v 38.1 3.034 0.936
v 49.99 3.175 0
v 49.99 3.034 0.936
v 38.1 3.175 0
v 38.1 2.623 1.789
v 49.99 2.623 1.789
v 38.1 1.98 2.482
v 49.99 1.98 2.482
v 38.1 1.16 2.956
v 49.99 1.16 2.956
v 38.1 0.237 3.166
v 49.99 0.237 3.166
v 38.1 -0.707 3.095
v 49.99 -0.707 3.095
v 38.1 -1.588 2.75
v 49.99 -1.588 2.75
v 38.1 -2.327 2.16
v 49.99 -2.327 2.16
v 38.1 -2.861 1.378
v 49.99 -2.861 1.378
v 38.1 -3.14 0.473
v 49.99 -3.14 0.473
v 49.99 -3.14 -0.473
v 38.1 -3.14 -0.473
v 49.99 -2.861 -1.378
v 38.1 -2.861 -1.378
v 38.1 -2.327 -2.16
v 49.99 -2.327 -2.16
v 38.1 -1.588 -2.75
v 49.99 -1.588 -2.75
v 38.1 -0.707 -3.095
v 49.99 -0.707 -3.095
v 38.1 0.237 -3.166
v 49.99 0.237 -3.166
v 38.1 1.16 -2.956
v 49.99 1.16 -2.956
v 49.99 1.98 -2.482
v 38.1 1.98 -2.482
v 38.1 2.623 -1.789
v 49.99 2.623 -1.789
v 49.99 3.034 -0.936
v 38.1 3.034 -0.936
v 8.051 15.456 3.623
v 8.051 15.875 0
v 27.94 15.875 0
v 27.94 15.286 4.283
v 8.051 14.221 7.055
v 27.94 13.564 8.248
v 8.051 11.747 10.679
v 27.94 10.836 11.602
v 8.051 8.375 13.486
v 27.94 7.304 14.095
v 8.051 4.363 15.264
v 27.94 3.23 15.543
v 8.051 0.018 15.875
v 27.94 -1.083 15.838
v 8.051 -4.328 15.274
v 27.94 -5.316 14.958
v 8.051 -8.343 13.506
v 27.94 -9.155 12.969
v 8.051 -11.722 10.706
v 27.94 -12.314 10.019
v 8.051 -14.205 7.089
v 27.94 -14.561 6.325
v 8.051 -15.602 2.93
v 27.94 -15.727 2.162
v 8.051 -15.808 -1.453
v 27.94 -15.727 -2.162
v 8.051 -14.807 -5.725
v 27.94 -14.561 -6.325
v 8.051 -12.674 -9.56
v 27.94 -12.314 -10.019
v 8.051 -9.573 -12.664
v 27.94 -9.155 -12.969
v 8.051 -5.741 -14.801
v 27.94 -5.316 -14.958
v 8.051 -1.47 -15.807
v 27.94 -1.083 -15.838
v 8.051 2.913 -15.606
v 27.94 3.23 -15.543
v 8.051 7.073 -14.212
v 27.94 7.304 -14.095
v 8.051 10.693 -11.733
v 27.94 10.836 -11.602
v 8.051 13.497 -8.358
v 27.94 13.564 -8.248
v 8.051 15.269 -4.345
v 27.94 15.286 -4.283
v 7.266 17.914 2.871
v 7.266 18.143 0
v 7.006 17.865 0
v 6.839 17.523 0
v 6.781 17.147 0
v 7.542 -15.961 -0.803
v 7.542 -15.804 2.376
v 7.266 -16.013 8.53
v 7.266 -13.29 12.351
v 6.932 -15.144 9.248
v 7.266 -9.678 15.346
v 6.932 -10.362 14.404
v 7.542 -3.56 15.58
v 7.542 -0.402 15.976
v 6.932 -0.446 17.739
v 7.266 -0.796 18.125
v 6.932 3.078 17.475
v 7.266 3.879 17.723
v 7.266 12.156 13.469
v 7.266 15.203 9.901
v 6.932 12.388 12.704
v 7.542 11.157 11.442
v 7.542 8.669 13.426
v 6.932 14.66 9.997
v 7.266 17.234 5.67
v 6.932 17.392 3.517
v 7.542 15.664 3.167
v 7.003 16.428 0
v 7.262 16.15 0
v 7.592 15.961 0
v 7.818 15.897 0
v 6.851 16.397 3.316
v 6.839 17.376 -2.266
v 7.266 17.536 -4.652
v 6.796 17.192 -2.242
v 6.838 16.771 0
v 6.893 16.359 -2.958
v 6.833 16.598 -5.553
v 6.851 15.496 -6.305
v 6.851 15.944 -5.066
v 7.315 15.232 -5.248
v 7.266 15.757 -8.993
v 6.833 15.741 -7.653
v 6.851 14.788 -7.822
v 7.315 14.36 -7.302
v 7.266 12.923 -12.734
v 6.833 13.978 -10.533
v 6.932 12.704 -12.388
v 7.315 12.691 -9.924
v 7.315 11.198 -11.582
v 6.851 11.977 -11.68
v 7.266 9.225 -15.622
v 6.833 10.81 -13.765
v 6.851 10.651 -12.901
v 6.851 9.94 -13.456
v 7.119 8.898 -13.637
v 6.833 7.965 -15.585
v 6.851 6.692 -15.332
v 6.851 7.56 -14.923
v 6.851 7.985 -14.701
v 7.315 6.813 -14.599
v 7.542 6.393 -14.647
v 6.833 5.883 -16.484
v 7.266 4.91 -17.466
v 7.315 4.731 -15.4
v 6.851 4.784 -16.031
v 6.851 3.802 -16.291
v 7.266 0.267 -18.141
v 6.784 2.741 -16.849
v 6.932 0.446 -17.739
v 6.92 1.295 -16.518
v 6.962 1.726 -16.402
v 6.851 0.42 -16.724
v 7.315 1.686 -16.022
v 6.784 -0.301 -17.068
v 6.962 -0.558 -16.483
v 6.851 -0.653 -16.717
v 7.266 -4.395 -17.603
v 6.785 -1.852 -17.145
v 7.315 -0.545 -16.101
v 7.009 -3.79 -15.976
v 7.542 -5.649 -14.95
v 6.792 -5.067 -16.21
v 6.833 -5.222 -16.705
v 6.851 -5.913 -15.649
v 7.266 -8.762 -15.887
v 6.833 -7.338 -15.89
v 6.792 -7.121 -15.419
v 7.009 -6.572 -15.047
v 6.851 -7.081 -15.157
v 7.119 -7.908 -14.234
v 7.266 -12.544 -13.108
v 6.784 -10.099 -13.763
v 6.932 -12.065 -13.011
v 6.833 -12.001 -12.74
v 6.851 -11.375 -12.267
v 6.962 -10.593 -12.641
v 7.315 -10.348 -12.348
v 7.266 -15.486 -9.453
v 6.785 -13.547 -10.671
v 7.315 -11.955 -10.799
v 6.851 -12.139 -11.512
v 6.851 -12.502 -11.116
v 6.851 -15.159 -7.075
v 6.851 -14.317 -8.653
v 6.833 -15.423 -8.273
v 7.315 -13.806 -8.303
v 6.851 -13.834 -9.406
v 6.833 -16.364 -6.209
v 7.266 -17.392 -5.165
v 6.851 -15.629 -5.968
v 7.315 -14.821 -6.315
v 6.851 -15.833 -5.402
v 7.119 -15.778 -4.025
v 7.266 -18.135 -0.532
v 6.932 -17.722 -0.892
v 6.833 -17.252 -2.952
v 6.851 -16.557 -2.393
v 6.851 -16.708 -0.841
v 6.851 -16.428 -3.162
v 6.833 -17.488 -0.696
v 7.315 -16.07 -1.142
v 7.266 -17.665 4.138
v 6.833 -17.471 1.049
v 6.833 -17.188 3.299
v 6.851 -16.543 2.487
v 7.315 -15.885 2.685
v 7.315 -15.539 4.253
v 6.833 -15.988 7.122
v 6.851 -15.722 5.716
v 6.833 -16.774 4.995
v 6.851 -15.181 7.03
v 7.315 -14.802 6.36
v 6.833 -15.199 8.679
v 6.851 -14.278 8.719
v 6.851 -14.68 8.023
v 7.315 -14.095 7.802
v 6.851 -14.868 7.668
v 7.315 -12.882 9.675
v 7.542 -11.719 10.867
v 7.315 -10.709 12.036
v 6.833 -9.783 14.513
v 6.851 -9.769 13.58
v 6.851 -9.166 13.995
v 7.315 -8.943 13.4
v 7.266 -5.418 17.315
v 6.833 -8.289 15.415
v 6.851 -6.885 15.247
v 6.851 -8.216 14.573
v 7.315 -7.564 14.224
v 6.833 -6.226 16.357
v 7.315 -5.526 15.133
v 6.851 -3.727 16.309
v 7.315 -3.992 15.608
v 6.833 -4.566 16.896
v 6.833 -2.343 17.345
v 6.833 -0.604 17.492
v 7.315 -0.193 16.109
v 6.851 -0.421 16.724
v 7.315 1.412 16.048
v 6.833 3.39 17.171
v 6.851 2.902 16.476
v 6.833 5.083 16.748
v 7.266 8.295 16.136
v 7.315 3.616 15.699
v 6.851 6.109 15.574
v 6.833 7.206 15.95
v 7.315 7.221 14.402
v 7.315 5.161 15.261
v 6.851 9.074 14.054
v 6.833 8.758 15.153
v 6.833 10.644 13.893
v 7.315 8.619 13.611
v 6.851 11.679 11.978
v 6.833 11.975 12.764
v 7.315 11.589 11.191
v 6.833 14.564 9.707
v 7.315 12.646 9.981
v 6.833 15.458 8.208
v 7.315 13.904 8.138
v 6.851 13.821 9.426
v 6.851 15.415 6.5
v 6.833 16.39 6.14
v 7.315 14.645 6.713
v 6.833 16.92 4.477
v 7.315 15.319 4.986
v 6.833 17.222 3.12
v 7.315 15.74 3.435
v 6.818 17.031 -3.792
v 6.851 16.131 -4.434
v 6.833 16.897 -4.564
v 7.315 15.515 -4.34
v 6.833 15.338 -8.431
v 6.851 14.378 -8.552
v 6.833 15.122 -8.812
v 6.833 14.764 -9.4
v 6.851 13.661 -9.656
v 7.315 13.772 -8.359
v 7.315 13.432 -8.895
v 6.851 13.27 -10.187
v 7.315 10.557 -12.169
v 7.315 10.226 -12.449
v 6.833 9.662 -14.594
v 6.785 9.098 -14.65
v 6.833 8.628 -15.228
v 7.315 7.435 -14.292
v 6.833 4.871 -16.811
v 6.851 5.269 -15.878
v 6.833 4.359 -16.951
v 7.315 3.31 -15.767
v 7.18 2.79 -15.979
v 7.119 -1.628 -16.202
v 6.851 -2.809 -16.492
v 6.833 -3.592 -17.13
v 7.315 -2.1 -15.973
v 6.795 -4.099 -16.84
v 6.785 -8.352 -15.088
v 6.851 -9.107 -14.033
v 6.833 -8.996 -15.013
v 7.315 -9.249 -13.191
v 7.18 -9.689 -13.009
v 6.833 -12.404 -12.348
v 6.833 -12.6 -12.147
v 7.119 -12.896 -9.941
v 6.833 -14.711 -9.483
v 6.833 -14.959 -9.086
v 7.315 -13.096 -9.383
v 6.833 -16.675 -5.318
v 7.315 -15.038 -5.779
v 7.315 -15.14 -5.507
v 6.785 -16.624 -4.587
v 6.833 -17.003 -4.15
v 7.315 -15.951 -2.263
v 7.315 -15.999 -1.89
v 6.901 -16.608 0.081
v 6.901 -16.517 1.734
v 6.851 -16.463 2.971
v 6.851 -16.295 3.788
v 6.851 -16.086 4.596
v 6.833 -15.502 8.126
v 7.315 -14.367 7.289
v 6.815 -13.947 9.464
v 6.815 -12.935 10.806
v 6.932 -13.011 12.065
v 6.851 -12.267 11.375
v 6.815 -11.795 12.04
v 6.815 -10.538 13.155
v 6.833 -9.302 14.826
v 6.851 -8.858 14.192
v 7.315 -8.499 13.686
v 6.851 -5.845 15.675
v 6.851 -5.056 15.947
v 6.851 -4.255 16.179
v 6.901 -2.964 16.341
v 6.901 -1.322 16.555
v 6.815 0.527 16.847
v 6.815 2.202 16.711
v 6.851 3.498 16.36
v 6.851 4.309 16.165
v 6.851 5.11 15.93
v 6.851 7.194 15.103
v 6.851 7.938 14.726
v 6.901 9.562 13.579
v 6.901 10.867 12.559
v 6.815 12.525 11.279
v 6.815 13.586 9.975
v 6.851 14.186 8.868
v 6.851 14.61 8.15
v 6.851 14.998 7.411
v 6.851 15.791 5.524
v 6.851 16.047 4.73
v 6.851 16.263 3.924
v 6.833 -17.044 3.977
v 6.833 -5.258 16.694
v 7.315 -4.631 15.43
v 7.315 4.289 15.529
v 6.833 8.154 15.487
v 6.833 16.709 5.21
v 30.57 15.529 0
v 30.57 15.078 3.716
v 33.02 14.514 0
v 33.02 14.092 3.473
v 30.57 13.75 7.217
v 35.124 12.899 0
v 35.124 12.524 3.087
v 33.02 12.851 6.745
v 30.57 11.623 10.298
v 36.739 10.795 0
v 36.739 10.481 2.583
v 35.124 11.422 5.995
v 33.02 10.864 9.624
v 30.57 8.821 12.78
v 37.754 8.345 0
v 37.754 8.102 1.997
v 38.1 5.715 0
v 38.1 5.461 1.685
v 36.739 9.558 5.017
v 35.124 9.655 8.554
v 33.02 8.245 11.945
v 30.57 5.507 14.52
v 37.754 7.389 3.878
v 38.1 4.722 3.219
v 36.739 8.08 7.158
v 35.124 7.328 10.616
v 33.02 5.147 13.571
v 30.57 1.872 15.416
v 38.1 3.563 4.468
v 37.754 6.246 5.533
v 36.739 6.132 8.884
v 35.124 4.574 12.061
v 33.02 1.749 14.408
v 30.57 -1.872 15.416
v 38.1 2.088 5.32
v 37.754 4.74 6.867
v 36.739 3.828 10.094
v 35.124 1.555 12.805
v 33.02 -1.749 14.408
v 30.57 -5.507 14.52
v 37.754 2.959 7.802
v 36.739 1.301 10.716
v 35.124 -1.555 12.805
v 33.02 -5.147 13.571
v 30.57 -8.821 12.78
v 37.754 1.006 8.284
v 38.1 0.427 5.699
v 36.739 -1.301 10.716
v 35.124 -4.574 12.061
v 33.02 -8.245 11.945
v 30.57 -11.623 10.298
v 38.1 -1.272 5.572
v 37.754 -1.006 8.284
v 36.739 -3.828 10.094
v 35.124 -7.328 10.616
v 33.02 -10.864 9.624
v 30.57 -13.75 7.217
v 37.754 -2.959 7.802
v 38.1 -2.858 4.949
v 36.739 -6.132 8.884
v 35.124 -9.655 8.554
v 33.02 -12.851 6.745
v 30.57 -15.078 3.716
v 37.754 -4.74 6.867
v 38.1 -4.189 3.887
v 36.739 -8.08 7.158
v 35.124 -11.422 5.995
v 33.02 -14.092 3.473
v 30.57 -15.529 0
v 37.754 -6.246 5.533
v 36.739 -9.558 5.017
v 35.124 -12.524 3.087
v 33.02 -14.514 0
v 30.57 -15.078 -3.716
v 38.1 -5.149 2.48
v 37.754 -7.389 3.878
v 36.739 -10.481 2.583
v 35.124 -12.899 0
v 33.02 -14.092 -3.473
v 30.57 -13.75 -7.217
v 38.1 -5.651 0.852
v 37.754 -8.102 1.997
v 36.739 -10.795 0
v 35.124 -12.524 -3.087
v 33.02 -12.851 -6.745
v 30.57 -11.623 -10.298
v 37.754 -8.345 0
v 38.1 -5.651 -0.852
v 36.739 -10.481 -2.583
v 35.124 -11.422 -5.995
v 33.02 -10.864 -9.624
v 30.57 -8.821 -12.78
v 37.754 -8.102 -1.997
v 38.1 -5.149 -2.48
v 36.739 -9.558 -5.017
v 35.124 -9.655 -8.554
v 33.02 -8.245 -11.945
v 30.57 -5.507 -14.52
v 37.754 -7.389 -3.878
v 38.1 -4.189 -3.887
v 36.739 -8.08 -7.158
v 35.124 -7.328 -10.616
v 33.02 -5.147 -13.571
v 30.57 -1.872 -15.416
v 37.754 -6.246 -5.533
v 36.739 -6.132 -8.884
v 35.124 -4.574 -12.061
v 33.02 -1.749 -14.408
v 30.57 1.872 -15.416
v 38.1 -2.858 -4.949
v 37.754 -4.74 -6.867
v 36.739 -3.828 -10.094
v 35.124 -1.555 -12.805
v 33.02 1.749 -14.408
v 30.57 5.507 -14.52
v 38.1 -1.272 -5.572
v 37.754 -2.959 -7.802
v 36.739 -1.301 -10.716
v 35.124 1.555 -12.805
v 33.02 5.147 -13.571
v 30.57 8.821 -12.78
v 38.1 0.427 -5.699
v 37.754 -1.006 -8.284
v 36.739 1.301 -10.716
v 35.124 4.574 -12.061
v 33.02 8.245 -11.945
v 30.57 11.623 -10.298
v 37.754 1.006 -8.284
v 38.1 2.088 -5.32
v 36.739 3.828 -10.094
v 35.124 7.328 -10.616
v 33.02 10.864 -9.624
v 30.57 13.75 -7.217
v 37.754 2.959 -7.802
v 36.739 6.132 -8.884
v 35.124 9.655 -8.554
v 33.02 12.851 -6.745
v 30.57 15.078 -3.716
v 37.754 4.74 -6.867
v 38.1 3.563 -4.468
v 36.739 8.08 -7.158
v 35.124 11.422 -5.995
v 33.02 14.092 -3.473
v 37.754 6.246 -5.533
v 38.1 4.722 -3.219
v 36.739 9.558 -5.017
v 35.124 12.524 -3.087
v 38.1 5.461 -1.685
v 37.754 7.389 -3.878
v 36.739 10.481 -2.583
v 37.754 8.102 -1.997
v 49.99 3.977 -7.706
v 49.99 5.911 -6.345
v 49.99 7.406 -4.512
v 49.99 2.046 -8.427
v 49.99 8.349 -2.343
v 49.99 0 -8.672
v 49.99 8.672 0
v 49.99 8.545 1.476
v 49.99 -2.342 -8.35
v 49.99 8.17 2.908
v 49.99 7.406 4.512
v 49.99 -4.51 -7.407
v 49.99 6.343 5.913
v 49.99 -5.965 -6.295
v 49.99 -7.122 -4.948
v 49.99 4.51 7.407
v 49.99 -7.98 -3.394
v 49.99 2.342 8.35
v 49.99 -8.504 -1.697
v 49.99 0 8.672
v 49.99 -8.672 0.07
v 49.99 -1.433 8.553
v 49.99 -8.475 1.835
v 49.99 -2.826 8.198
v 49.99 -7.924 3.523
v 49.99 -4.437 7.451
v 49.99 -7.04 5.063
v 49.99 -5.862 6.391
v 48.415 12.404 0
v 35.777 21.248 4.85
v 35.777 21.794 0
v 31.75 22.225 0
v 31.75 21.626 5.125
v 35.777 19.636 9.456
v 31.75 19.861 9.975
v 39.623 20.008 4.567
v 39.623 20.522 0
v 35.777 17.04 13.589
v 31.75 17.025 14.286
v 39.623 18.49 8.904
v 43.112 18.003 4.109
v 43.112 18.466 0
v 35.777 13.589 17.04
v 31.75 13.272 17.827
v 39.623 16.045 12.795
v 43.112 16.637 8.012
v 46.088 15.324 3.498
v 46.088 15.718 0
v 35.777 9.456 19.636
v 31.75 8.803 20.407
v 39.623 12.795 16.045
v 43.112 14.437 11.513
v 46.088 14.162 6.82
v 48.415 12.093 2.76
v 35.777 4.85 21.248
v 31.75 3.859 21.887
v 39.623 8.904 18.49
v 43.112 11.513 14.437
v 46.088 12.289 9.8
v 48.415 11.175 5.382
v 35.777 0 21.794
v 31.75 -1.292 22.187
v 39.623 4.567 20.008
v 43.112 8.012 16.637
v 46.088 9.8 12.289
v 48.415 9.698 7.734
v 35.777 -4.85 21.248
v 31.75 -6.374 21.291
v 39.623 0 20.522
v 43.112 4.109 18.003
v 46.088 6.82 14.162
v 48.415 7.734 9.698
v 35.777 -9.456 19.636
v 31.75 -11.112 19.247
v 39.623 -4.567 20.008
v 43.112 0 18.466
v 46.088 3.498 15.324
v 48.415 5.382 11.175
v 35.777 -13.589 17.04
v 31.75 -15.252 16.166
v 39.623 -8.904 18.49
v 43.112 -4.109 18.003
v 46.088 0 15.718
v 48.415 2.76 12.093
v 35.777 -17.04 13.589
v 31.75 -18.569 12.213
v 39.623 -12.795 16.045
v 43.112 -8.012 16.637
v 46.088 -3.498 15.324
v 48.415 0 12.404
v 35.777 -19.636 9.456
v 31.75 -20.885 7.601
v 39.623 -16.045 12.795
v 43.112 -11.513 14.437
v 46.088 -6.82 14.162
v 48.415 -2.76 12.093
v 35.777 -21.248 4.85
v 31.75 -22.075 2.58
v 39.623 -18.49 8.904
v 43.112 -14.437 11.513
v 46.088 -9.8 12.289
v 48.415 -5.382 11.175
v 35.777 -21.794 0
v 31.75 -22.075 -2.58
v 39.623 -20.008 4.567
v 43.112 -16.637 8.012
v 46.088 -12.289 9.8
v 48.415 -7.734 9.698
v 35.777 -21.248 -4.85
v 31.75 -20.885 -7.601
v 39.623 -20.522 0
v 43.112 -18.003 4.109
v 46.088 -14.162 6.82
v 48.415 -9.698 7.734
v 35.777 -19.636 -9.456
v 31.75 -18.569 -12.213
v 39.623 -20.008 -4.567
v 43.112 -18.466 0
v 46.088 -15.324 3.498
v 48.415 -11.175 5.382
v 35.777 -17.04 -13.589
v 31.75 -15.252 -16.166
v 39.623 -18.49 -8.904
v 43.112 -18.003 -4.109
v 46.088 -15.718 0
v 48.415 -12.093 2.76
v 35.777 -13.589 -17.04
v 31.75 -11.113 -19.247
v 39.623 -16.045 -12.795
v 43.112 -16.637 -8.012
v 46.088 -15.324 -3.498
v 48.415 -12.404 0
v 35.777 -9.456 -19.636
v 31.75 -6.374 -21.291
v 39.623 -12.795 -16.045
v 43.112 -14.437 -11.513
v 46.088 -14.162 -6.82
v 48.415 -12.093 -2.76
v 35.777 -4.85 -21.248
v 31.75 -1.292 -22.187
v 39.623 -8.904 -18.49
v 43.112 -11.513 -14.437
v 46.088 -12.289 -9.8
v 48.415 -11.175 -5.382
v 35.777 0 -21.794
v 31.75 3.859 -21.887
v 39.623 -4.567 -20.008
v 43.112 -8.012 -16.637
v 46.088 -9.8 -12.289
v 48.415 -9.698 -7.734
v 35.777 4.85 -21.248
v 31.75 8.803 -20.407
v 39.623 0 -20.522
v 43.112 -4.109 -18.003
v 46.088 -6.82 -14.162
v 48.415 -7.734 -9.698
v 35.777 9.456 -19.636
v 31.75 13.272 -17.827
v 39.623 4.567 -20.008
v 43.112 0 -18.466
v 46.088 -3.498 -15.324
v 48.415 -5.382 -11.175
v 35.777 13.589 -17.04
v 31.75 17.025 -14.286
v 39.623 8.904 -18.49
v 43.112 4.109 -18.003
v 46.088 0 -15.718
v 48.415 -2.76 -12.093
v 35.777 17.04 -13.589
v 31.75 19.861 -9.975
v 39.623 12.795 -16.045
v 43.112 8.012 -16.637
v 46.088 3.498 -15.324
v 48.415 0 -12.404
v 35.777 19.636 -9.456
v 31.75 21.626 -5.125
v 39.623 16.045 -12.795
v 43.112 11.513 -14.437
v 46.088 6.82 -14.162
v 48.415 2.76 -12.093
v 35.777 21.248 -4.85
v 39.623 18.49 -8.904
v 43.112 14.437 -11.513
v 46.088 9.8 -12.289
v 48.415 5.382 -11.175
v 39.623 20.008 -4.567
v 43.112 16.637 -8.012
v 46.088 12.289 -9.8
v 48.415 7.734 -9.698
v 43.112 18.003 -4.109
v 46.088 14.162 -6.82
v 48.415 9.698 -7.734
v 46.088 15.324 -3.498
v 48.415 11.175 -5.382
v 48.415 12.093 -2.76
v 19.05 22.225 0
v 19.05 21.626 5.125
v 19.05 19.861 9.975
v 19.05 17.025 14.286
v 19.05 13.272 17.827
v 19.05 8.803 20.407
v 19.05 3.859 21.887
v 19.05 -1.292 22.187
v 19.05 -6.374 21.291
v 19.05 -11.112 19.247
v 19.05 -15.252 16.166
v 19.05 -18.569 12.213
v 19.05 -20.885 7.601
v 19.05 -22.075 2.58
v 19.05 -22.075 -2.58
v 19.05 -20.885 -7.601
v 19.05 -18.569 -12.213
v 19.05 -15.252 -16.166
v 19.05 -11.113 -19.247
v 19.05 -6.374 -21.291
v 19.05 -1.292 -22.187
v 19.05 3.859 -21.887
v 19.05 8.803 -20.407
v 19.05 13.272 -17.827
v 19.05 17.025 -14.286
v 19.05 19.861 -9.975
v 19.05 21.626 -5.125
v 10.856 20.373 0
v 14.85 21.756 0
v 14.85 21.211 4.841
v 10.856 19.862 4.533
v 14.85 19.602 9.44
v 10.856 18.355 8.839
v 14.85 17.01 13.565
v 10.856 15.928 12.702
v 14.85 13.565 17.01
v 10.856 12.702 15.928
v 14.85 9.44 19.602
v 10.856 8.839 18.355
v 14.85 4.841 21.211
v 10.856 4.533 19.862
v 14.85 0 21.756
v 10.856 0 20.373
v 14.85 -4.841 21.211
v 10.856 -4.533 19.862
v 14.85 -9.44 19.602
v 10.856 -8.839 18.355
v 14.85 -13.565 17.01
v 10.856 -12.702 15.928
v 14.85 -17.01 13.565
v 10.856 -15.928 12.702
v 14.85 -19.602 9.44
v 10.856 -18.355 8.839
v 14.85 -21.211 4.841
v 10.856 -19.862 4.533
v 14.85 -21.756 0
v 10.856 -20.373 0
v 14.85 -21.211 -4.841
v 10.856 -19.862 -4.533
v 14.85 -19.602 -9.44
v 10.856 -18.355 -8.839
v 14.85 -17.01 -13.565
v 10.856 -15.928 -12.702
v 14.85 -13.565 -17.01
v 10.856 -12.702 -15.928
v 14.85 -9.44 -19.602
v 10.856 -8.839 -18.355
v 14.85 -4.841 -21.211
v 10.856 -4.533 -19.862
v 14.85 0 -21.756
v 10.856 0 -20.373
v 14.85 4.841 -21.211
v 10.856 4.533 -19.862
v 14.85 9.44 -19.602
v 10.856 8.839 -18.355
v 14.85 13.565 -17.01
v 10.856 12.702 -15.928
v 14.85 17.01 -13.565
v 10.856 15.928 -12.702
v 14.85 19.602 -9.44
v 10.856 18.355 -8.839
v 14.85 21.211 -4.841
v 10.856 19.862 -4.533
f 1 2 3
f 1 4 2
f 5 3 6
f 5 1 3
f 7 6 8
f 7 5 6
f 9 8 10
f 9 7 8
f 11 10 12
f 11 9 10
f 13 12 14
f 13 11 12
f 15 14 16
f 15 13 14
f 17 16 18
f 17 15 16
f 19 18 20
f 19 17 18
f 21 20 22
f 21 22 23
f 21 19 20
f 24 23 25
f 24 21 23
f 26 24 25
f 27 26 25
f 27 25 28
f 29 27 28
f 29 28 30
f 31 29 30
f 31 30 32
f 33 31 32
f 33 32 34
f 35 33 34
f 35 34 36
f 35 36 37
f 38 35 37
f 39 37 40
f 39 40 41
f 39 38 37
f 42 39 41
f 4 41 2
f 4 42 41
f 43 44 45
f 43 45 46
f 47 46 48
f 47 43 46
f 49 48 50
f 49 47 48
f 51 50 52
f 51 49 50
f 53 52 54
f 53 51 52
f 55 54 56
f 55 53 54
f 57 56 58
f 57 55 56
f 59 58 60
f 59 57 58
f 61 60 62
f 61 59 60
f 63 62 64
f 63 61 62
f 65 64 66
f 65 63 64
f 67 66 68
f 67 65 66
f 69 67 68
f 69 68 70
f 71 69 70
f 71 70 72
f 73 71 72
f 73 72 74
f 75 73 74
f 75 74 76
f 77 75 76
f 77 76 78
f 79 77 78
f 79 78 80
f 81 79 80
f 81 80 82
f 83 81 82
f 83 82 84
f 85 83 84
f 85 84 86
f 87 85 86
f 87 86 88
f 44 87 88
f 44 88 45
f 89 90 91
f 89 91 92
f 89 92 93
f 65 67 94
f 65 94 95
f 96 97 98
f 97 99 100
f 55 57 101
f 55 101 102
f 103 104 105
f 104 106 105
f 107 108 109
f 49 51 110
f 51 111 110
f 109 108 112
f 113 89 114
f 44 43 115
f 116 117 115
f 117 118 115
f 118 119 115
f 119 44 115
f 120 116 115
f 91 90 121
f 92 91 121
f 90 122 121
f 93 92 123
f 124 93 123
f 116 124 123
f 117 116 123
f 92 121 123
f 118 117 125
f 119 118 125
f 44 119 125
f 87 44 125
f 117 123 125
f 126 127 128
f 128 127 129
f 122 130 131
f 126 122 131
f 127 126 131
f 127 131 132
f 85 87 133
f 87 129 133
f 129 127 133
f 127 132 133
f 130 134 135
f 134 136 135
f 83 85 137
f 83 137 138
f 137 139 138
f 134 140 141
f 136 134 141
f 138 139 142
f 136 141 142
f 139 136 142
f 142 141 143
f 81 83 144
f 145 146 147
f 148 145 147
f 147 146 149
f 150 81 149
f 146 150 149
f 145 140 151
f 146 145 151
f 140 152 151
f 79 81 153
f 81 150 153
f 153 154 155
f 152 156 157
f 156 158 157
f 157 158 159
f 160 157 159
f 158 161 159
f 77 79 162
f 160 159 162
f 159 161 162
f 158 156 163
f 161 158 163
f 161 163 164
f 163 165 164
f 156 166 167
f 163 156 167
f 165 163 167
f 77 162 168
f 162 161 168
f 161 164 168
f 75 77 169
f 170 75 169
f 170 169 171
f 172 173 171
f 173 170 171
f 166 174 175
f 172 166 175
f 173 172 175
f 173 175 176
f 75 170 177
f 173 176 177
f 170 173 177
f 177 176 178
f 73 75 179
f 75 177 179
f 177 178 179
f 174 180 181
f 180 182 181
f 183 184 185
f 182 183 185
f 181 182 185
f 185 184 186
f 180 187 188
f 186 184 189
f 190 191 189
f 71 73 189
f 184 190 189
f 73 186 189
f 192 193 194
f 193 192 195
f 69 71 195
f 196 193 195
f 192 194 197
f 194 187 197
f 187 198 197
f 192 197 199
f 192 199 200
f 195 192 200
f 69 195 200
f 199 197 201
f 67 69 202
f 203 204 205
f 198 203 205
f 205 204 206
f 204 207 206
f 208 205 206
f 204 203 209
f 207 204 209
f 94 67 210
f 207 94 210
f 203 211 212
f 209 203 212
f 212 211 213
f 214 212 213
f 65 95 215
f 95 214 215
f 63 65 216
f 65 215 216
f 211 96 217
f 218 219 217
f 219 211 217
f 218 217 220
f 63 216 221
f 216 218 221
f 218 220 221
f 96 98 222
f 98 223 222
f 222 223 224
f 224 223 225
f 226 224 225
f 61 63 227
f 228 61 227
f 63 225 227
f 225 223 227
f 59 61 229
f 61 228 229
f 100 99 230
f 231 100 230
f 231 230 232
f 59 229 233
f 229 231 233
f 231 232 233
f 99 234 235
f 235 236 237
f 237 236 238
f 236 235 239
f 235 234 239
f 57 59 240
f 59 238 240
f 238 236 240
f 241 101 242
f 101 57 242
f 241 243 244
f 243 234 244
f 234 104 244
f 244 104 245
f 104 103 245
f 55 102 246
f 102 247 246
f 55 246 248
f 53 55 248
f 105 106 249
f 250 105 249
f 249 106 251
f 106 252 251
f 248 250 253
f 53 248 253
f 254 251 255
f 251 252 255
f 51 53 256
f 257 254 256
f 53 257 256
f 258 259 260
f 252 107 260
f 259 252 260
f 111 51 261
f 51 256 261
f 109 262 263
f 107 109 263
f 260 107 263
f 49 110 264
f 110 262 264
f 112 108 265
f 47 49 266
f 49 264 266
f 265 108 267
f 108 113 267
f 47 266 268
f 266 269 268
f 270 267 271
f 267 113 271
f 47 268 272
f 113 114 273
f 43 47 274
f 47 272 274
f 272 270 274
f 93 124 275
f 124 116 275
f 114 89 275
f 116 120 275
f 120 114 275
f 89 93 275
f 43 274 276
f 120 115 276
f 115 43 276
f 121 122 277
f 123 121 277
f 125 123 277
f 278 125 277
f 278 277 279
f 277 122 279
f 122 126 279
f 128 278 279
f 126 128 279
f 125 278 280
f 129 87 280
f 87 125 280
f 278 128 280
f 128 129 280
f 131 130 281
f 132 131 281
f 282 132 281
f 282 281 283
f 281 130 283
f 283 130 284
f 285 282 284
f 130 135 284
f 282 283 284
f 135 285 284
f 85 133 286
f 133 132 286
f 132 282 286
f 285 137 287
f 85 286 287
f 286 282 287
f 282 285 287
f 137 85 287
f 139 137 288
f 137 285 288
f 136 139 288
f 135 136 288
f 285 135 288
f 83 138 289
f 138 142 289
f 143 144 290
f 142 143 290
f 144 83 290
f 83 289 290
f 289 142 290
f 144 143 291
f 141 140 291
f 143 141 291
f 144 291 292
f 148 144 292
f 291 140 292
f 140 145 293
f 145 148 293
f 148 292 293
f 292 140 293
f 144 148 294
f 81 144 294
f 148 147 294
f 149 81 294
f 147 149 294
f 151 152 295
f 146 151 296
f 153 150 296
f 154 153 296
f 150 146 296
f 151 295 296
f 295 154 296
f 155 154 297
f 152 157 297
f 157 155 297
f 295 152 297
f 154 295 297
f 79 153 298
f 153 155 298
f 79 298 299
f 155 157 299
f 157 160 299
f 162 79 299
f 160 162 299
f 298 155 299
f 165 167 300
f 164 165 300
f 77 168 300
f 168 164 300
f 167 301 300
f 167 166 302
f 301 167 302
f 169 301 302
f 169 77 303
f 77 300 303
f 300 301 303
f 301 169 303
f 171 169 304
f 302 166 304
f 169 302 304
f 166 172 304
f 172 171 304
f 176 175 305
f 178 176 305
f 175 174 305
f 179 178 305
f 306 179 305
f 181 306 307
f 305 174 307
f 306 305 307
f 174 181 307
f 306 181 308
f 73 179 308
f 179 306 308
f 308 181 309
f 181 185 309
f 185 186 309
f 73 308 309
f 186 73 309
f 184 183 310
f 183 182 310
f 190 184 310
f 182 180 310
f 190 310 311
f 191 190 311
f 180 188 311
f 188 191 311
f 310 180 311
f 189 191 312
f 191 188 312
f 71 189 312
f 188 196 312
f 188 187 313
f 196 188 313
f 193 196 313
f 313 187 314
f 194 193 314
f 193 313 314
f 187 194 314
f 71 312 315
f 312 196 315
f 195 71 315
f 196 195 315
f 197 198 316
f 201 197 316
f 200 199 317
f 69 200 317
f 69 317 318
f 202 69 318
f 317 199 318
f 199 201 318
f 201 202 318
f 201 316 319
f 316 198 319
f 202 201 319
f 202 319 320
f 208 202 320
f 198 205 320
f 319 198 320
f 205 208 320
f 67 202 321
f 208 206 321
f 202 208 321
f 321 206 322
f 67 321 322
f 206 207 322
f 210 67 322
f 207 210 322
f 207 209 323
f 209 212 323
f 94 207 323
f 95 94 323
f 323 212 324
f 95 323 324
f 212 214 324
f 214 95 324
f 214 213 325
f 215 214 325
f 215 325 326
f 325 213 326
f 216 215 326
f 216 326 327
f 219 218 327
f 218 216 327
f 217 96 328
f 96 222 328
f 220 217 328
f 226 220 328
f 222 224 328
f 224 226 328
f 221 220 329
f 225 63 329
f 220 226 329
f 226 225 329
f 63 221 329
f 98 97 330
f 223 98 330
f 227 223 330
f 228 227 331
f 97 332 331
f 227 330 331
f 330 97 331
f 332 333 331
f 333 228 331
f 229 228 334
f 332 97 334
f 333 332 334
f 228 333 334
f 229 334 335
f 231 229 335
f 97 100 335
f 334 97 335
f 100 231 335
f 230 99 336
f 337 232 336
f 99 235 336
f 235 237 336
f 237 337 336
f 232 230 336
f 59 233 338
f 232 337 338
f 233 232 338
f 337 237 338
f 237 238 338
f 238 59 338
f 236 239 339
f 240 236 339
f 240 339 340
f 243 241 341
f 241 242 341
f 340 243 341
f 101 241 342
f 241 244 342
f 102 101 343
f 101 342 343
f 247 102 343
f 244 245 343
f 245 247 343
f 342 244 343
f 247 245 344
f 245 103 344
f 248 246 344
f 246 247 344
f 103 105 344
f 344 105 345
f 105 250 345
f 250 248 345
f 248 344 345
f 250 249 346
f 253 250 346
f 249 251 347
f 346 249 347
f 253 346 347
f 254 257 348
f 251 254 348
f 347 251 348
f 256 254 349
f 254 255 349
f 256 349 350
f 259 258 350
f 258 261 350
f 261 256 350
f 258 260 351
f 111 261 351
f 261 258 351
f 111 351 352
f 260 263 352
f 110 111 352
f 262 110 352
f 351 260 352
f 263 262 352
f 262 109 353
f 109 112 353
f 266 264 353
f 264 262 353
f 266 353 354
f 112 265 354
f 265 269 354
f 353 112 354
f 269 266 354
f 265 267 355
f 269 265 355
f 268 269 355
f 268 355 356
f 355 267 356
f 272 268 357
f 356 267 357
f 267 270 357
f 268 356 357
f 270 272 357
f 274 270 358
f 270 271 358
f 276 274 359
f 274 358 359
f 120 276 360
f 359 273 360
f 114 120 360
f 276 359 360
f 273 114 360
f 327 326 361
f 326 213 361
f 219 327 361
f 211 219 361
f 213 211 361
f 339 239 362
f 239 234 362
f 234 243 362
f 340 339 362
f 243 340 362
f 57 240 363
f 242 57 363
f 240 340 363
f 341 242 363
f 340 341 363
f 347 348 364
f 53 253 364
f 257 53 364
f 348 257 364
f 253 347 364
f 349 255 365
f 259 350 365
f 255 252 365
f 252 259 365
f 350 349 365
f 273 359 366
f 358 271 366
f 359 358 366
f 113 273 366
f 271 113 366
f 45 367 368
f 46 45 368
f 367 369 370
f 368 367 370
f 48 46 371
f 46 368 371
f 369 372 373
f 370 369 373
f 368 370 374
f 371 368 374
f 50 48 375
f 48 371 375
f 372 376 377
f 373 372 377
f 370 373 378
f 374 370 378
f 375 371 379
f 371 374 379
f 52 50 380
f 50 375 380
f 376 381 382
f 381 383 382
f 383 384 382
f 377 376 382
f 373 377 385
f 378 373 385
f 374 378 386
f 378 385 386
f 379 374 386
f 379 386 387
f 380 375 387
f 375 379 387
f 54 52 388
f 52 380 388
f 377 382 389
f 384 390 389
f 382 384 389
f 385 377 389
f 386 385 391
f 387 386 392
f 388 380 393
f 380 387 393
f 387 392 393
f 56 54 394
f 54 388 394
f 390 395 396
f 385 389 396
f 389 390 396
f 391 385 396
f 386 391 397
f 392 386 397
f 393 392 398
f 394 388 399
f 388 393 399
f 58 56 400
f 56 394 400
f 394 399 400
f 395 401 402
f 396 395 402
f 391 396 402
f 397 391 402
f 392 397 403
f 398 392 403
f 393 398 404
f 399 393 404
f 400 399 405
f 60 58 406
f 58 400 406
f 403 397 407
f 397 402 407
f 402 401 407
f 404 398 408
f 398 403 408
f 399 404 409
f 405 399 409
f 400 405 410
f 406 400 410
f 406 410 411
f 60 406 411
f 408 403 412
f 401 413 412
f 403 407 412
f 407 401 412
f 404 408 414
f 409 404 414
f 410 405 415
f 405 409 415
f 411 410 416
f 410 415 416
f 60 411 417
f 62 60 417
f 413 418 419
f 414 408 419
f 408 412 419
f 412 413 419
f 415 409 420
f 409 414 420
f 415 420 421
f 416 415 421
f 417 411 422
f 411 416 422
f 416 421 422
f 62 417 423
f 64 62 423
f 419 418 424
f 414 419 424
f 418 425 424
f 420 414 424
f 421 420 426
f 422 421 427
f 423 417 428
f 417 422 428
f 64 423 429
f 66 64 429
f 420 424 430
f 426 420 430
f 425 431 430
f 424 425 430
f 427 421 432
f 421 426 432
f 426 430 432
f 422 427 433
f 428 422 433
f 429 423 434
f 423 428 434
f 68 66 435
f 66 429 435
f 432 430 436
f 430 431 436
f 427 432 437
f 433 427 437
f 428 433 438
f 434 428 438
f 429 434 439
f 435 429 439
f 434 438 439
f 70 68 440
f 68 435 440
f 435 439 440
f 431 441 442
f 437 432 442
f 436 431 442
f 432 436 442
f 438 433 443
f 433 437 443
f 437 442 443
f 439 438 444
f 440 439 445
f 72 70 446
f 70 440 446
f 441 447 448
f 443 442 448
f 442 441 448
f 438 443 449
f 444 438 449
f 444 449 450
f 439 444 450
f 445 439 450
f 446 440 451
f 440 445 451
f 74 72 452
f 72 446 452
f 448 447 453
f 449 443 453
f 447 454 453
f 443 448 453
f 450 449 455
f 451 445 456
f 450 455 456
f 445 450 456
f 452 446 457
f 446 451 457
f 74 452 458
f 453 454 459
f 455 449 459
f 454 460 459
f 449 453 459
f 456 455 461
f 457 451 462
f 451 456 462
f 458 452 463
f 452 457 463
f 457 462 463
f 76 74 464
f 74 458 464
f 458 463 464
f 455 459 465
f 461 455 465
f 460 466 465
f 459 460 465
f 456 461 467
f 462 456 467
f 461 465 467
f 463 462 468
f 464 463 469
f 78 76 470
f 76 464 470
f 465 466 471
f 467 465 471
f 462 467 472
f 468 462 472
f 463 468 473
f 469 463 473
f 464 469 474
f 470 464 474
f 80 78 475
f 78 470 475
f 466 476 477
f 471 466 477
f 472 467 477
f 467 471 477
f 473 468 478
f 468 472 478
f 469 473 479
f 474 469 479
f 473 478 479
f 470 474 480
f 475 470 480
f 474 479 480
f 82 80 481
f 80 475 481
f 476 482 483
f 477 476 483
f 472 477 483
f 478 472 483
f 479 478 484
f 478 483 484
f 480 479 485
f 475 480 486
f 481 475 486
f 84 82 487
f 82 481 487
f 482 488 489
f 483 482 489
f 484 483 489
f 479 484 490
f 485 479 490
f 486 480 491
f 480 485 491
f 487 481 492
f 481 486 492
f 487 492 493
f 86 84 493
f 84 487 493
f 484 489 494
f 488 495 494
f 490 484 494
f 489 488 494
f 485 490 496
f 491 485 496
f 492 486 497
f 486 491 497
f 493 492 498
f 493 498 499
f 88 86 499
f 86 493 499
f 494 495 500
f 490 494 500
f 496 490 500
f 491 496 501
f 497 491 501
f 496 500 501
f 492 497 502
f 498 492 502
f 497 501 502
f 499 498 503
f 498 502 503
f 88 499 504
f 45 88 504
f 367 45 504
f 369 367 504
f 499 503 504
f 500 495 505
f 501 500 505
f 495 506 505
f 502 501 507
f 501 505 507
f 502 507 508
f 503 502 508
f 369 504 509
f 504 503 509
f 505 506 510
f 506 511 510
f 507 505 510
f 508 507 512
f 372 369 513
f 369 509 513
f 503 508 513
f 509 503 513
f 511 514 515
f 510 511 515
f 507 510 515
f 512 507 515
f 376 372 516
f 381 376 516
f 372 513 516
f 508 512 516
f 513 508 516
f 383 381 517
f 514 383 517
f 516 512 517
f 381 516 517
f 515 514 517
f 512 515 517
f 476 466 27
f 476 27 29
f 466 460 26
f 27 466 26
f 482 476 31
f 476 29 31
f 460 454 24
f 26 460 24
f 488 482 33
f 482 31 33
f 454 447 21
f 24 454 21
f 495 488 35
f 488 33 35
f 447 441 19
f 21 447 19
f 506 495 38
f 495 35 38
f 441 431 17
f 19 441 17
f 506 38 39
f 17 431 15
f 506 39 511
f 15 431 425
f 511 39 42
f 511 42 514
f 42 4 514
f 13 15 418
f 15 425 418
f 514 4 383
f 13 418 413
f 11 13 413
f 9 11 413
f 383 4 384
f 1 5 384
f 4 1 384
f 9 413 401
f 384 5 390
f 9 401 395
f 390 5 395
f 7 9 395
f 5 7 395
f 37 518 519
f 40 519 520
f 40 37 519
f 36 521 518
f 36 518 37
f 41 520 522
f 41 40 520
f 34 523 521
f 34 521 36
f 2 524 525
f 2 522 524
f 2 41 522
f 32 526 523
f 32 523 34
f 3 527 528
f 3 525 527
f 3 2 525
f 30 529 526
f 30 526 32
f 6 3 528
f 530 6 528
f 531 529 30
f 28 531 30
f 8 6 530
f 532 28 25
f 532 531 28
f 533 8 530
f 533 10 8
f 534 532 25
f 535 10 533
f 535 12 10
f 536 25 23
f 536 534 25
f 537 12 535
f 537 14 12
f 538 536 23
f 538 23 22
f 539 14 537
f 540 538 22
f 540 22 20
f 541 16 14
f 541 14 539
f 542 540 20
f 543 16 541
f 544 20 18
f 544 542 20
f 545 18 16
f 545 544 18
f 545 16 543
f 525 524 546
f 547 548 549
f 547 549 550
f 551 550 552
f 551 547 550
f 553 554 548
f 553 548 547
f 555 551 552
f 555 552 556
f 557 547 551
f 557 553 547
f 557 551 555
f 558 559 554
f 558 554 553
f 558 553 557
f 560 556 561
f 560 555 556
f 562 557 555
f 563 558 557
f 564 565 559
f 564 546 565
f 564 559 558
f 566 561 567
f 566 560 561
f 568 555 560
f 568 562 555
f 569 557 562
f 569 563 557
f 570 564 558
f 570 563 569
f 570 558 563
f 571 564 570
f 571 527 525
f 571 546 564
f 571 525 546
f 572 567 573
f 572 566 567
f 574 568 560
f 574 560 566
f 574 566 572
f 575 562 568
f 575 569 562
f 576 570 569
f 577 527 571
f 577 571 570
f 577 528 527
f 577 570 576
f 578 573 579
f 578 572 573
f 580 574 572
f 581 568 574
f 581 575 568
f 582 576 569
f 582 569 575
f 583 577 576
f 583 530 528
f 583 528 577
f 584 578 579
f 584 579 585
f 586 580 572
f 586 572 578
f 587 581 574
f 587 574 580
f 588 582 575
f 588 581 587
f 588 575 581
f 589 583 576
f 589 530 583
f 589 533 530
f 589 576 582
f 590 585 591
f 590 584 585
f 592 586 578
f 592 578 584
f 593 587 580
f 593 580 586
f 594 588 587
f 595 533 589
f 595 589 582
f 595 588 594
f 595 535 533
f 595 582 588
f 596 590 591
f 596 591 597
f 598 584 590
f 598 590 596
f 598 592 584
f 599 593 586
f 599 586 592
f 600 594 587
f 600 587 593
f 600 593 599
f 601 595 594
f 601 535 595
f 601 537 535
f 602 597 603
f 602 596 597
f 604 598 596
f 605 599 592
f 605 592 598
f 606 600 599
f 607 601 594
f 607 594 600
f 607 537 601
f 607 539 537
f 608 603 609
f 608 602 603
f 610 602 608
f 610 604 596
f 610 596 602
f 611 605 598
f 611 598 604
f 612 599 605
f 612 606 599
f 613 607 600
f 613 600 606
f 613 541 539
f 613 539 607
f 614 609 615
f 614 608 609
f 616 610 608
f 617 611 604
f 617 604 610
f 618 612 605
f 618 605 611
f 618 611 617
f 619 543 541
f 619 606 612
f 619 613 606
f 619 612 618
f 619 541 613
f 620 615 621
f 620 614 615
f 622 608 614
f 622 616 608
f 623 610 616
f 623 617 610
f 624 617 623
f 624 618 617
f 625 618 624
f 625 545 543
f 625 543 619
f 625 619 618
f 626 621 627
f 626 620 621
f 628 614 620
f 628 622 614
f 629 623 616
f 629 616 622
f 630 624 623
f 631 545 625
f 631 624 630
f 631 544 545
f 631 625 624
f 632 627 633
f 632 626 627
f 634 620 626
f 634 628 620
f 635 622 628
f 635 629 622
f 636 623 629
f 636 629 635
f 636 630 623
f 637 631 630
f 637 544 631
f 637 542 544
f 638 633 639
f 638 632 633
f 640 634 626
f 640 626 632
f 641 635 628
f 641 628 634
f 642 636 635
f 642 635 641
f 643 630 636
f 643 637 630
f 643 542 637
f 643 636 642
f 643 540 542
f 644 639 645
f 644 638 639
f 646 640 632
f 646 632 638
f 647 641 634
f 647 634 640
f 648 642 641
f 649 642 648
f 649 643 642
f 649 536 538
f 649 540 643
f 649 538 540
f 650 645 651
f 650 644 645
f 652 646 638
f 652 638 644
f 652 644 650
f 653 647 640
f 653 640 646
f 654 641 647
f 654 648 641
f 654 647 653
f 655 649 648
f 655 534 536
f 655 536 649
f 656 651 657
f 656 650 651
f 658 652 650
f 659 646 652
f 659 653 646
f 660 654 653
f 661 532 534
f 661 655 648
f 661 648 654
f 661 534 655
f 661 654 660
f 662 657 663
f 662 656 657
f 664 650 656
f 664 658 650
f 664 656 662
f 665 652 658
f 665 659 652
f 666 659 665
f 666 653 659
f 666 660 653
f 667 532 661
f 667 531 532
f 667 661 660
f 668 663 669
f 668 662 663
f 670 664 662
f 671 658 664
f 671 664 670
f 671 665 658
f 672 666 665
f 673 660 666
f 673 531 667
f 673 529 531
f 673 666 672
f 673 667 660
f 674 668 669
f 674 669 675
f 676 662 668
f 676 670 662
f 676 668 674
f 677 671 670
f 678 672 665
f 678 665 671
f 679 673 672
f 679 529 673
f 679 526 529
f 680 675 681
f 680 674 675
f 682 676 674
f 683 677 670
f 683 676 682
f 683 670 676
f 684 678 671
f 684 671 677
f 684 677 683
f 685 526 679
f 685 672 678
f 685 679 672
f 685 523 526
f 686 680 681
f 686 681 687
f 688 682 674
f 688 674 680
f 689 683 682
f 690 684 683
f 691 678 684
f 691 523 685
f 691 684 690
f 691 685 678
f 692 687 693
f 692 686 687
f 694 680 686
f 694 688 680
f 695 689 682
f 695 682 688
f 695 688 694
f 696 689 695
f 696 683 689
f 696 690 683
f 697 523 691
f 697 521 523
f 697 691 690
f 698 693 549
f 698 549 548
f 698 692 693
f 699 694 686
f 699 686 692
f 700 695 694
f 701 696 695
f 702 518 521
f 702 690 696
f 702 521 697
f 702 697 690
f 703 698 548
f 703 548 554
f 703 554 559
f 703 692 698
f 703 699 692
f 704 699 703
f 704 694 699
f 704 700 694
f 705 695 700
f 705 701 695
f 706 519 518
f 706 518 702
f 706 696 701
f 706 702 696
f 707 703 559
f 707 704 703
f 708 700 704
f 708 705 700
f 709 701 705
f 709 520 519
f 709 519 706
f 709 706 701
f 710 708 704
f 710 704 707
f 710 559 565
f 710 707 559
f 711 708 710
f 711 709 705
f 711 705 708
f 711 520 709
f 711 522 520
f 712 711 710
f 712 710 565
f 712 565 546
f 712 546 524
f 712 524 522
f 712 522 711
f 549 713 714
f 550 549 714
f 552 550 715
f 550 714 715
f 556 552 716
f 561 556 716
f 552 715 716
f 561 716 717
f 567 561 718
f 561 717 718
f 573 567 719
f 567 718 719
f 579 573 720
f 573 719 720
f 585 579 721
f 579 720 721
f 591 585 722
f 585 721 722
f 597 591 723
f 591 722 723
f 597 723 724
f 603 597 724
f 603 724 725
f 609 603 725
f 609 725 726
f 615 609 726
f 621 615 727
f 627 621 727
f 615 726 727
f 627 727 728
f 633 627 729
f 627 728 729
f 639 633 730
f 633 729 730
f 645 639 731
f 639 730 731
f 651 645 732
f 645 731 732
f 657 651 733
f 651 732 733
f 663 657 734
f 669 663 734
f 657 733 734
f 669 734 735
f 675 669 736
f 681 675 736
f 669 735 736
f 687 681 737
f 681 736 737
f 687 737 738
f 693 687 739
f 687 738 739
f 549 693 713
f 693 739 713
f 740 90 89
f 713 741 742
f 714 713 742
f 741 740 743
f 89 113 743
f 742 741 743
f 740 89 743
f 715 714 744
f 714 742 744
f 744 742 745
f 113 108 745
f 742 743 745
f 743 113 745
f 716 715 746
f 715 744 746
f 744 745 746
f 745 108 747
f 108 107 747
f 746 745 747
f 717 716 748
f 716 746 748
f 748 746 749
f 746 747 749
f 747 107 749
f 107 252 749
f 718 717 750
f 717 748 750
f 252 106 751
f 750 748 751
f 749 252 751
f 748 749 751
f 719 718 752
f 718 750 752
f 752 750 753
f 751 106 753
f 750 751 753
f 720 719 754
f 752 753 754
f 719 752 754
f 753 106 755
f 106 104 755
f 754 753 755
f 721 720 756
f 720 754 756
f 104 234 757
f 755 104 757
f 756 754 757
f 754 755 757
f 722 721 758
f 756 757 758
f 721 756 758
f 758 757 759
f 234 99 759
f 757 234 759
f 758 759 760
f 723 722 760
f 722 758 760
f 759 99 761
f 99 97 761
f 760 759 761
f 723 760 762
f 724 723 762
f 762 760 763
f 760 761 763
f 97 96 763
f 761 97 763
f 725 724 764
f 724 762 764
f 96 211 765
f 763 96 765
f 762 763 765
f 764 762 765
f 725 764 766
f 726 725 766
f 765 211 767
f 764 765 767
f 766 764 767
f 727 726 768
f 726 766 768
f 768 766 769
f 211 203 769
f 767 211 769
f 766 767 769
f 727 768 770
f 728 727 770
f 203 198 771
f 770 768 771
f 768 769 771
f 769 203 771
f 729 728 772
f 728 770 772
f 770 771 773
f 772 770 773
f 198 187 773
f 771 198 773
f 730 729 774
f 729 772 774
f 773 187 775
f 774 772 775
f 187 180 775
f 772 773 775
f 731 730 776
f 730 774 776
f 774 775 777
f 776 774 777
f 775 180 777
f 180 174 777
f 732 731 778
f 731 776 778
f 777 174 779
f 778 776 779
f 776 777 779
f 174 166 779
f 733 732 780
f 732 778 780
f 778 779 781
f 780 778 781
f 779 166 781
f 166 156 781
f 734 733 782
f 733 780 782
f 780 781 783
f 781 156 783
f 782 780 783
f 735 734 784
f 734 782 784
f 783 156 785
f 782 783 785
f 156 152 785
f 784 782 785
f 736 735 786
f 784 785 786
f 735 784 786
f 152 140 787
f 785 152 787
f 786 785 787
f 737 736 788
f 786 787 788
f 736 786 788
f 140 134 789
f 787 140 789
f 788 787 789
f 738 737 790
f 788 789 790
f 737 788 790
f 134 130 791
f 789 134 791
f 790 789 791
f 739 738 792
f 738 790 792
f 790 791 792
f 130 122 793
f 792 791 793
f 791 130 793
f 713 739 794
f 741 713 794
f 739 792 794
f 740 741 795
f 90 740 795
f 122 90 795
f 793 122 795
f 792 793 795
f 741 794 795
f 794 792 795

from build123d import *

# Parameters (mm, degrees)
F0_R           = 22.225
F1_DEPTH       = 50.8
F2_R           = 19.05
F3_R           = 15.875
F4_DEPTH       = 38.1
F5_R           = 1.27
F6_R           = 3.175
F7_DEPTH       = 50.801
F8_R           = 10.16
F9_W           = 6.6301524639
F9_H           = 19.9486073107
F10_DEPTH      = 22.2260001
F10_DEPTH_BACK = 25.4


with BuildPart() as f1:
    # F0 (on Right) → F1 (new body)
    with BuildSketch(Plane.YZ):
        Circle(F0_R)
    extrude(amount=F1_DEPTH)

    # F2
    f2_edges = [f1.edges().sort_by_distance(p)[0] for p in [
        (0, -22.225, 0),
        (50.8, -22.225, 0),
    ]]
    fillet(f2_edges, radius=F2_R)

    # F3 (on Right) → F4 (cut)
    with BuildSketch(Plane.YZ):
        Circle(F3_R)
    extrude(amount=F4_DEPTH, mode=Mode.SUBTRACT)

    # F5
    f5_edges = [f1.edges().sort_by_distance(p)[0] for p in [
        (4.850968, -15.875, 0),
    ]]
    fillet(f5_edges, radius=F5_R)

    # F6 (on Right) → F7 (cut, through all)
    with BuildSketch(Plane.YZ):
        Circle(F6_R)
    extrude(amount=F7_DEPTH, mode=Mode.SUBTRACT)

    # F8
    f8_edges = [f1.edges().sort_by_distance(p)[0] for p in [
        (38.1, -15.875, 0),
    ]]
    fillet(f8_edges, radius=F8_R)

    # F9 (on Front) → F10 (cut, two sides)
    with BuildSketch(Plane.XZ) as f10_sk:
        with Locations((53.3047877252, -1.149632968)):
            Rectangle(F9_W, F9_H)
    extrude(amount=-F10_DEPTH, mode=Mode.SUBTRACT)
    extrude(f10_sk.sketch, amount=F10_DEPTH_BACK, mode=Mode.SUBTRACT)


solid = f1.part
